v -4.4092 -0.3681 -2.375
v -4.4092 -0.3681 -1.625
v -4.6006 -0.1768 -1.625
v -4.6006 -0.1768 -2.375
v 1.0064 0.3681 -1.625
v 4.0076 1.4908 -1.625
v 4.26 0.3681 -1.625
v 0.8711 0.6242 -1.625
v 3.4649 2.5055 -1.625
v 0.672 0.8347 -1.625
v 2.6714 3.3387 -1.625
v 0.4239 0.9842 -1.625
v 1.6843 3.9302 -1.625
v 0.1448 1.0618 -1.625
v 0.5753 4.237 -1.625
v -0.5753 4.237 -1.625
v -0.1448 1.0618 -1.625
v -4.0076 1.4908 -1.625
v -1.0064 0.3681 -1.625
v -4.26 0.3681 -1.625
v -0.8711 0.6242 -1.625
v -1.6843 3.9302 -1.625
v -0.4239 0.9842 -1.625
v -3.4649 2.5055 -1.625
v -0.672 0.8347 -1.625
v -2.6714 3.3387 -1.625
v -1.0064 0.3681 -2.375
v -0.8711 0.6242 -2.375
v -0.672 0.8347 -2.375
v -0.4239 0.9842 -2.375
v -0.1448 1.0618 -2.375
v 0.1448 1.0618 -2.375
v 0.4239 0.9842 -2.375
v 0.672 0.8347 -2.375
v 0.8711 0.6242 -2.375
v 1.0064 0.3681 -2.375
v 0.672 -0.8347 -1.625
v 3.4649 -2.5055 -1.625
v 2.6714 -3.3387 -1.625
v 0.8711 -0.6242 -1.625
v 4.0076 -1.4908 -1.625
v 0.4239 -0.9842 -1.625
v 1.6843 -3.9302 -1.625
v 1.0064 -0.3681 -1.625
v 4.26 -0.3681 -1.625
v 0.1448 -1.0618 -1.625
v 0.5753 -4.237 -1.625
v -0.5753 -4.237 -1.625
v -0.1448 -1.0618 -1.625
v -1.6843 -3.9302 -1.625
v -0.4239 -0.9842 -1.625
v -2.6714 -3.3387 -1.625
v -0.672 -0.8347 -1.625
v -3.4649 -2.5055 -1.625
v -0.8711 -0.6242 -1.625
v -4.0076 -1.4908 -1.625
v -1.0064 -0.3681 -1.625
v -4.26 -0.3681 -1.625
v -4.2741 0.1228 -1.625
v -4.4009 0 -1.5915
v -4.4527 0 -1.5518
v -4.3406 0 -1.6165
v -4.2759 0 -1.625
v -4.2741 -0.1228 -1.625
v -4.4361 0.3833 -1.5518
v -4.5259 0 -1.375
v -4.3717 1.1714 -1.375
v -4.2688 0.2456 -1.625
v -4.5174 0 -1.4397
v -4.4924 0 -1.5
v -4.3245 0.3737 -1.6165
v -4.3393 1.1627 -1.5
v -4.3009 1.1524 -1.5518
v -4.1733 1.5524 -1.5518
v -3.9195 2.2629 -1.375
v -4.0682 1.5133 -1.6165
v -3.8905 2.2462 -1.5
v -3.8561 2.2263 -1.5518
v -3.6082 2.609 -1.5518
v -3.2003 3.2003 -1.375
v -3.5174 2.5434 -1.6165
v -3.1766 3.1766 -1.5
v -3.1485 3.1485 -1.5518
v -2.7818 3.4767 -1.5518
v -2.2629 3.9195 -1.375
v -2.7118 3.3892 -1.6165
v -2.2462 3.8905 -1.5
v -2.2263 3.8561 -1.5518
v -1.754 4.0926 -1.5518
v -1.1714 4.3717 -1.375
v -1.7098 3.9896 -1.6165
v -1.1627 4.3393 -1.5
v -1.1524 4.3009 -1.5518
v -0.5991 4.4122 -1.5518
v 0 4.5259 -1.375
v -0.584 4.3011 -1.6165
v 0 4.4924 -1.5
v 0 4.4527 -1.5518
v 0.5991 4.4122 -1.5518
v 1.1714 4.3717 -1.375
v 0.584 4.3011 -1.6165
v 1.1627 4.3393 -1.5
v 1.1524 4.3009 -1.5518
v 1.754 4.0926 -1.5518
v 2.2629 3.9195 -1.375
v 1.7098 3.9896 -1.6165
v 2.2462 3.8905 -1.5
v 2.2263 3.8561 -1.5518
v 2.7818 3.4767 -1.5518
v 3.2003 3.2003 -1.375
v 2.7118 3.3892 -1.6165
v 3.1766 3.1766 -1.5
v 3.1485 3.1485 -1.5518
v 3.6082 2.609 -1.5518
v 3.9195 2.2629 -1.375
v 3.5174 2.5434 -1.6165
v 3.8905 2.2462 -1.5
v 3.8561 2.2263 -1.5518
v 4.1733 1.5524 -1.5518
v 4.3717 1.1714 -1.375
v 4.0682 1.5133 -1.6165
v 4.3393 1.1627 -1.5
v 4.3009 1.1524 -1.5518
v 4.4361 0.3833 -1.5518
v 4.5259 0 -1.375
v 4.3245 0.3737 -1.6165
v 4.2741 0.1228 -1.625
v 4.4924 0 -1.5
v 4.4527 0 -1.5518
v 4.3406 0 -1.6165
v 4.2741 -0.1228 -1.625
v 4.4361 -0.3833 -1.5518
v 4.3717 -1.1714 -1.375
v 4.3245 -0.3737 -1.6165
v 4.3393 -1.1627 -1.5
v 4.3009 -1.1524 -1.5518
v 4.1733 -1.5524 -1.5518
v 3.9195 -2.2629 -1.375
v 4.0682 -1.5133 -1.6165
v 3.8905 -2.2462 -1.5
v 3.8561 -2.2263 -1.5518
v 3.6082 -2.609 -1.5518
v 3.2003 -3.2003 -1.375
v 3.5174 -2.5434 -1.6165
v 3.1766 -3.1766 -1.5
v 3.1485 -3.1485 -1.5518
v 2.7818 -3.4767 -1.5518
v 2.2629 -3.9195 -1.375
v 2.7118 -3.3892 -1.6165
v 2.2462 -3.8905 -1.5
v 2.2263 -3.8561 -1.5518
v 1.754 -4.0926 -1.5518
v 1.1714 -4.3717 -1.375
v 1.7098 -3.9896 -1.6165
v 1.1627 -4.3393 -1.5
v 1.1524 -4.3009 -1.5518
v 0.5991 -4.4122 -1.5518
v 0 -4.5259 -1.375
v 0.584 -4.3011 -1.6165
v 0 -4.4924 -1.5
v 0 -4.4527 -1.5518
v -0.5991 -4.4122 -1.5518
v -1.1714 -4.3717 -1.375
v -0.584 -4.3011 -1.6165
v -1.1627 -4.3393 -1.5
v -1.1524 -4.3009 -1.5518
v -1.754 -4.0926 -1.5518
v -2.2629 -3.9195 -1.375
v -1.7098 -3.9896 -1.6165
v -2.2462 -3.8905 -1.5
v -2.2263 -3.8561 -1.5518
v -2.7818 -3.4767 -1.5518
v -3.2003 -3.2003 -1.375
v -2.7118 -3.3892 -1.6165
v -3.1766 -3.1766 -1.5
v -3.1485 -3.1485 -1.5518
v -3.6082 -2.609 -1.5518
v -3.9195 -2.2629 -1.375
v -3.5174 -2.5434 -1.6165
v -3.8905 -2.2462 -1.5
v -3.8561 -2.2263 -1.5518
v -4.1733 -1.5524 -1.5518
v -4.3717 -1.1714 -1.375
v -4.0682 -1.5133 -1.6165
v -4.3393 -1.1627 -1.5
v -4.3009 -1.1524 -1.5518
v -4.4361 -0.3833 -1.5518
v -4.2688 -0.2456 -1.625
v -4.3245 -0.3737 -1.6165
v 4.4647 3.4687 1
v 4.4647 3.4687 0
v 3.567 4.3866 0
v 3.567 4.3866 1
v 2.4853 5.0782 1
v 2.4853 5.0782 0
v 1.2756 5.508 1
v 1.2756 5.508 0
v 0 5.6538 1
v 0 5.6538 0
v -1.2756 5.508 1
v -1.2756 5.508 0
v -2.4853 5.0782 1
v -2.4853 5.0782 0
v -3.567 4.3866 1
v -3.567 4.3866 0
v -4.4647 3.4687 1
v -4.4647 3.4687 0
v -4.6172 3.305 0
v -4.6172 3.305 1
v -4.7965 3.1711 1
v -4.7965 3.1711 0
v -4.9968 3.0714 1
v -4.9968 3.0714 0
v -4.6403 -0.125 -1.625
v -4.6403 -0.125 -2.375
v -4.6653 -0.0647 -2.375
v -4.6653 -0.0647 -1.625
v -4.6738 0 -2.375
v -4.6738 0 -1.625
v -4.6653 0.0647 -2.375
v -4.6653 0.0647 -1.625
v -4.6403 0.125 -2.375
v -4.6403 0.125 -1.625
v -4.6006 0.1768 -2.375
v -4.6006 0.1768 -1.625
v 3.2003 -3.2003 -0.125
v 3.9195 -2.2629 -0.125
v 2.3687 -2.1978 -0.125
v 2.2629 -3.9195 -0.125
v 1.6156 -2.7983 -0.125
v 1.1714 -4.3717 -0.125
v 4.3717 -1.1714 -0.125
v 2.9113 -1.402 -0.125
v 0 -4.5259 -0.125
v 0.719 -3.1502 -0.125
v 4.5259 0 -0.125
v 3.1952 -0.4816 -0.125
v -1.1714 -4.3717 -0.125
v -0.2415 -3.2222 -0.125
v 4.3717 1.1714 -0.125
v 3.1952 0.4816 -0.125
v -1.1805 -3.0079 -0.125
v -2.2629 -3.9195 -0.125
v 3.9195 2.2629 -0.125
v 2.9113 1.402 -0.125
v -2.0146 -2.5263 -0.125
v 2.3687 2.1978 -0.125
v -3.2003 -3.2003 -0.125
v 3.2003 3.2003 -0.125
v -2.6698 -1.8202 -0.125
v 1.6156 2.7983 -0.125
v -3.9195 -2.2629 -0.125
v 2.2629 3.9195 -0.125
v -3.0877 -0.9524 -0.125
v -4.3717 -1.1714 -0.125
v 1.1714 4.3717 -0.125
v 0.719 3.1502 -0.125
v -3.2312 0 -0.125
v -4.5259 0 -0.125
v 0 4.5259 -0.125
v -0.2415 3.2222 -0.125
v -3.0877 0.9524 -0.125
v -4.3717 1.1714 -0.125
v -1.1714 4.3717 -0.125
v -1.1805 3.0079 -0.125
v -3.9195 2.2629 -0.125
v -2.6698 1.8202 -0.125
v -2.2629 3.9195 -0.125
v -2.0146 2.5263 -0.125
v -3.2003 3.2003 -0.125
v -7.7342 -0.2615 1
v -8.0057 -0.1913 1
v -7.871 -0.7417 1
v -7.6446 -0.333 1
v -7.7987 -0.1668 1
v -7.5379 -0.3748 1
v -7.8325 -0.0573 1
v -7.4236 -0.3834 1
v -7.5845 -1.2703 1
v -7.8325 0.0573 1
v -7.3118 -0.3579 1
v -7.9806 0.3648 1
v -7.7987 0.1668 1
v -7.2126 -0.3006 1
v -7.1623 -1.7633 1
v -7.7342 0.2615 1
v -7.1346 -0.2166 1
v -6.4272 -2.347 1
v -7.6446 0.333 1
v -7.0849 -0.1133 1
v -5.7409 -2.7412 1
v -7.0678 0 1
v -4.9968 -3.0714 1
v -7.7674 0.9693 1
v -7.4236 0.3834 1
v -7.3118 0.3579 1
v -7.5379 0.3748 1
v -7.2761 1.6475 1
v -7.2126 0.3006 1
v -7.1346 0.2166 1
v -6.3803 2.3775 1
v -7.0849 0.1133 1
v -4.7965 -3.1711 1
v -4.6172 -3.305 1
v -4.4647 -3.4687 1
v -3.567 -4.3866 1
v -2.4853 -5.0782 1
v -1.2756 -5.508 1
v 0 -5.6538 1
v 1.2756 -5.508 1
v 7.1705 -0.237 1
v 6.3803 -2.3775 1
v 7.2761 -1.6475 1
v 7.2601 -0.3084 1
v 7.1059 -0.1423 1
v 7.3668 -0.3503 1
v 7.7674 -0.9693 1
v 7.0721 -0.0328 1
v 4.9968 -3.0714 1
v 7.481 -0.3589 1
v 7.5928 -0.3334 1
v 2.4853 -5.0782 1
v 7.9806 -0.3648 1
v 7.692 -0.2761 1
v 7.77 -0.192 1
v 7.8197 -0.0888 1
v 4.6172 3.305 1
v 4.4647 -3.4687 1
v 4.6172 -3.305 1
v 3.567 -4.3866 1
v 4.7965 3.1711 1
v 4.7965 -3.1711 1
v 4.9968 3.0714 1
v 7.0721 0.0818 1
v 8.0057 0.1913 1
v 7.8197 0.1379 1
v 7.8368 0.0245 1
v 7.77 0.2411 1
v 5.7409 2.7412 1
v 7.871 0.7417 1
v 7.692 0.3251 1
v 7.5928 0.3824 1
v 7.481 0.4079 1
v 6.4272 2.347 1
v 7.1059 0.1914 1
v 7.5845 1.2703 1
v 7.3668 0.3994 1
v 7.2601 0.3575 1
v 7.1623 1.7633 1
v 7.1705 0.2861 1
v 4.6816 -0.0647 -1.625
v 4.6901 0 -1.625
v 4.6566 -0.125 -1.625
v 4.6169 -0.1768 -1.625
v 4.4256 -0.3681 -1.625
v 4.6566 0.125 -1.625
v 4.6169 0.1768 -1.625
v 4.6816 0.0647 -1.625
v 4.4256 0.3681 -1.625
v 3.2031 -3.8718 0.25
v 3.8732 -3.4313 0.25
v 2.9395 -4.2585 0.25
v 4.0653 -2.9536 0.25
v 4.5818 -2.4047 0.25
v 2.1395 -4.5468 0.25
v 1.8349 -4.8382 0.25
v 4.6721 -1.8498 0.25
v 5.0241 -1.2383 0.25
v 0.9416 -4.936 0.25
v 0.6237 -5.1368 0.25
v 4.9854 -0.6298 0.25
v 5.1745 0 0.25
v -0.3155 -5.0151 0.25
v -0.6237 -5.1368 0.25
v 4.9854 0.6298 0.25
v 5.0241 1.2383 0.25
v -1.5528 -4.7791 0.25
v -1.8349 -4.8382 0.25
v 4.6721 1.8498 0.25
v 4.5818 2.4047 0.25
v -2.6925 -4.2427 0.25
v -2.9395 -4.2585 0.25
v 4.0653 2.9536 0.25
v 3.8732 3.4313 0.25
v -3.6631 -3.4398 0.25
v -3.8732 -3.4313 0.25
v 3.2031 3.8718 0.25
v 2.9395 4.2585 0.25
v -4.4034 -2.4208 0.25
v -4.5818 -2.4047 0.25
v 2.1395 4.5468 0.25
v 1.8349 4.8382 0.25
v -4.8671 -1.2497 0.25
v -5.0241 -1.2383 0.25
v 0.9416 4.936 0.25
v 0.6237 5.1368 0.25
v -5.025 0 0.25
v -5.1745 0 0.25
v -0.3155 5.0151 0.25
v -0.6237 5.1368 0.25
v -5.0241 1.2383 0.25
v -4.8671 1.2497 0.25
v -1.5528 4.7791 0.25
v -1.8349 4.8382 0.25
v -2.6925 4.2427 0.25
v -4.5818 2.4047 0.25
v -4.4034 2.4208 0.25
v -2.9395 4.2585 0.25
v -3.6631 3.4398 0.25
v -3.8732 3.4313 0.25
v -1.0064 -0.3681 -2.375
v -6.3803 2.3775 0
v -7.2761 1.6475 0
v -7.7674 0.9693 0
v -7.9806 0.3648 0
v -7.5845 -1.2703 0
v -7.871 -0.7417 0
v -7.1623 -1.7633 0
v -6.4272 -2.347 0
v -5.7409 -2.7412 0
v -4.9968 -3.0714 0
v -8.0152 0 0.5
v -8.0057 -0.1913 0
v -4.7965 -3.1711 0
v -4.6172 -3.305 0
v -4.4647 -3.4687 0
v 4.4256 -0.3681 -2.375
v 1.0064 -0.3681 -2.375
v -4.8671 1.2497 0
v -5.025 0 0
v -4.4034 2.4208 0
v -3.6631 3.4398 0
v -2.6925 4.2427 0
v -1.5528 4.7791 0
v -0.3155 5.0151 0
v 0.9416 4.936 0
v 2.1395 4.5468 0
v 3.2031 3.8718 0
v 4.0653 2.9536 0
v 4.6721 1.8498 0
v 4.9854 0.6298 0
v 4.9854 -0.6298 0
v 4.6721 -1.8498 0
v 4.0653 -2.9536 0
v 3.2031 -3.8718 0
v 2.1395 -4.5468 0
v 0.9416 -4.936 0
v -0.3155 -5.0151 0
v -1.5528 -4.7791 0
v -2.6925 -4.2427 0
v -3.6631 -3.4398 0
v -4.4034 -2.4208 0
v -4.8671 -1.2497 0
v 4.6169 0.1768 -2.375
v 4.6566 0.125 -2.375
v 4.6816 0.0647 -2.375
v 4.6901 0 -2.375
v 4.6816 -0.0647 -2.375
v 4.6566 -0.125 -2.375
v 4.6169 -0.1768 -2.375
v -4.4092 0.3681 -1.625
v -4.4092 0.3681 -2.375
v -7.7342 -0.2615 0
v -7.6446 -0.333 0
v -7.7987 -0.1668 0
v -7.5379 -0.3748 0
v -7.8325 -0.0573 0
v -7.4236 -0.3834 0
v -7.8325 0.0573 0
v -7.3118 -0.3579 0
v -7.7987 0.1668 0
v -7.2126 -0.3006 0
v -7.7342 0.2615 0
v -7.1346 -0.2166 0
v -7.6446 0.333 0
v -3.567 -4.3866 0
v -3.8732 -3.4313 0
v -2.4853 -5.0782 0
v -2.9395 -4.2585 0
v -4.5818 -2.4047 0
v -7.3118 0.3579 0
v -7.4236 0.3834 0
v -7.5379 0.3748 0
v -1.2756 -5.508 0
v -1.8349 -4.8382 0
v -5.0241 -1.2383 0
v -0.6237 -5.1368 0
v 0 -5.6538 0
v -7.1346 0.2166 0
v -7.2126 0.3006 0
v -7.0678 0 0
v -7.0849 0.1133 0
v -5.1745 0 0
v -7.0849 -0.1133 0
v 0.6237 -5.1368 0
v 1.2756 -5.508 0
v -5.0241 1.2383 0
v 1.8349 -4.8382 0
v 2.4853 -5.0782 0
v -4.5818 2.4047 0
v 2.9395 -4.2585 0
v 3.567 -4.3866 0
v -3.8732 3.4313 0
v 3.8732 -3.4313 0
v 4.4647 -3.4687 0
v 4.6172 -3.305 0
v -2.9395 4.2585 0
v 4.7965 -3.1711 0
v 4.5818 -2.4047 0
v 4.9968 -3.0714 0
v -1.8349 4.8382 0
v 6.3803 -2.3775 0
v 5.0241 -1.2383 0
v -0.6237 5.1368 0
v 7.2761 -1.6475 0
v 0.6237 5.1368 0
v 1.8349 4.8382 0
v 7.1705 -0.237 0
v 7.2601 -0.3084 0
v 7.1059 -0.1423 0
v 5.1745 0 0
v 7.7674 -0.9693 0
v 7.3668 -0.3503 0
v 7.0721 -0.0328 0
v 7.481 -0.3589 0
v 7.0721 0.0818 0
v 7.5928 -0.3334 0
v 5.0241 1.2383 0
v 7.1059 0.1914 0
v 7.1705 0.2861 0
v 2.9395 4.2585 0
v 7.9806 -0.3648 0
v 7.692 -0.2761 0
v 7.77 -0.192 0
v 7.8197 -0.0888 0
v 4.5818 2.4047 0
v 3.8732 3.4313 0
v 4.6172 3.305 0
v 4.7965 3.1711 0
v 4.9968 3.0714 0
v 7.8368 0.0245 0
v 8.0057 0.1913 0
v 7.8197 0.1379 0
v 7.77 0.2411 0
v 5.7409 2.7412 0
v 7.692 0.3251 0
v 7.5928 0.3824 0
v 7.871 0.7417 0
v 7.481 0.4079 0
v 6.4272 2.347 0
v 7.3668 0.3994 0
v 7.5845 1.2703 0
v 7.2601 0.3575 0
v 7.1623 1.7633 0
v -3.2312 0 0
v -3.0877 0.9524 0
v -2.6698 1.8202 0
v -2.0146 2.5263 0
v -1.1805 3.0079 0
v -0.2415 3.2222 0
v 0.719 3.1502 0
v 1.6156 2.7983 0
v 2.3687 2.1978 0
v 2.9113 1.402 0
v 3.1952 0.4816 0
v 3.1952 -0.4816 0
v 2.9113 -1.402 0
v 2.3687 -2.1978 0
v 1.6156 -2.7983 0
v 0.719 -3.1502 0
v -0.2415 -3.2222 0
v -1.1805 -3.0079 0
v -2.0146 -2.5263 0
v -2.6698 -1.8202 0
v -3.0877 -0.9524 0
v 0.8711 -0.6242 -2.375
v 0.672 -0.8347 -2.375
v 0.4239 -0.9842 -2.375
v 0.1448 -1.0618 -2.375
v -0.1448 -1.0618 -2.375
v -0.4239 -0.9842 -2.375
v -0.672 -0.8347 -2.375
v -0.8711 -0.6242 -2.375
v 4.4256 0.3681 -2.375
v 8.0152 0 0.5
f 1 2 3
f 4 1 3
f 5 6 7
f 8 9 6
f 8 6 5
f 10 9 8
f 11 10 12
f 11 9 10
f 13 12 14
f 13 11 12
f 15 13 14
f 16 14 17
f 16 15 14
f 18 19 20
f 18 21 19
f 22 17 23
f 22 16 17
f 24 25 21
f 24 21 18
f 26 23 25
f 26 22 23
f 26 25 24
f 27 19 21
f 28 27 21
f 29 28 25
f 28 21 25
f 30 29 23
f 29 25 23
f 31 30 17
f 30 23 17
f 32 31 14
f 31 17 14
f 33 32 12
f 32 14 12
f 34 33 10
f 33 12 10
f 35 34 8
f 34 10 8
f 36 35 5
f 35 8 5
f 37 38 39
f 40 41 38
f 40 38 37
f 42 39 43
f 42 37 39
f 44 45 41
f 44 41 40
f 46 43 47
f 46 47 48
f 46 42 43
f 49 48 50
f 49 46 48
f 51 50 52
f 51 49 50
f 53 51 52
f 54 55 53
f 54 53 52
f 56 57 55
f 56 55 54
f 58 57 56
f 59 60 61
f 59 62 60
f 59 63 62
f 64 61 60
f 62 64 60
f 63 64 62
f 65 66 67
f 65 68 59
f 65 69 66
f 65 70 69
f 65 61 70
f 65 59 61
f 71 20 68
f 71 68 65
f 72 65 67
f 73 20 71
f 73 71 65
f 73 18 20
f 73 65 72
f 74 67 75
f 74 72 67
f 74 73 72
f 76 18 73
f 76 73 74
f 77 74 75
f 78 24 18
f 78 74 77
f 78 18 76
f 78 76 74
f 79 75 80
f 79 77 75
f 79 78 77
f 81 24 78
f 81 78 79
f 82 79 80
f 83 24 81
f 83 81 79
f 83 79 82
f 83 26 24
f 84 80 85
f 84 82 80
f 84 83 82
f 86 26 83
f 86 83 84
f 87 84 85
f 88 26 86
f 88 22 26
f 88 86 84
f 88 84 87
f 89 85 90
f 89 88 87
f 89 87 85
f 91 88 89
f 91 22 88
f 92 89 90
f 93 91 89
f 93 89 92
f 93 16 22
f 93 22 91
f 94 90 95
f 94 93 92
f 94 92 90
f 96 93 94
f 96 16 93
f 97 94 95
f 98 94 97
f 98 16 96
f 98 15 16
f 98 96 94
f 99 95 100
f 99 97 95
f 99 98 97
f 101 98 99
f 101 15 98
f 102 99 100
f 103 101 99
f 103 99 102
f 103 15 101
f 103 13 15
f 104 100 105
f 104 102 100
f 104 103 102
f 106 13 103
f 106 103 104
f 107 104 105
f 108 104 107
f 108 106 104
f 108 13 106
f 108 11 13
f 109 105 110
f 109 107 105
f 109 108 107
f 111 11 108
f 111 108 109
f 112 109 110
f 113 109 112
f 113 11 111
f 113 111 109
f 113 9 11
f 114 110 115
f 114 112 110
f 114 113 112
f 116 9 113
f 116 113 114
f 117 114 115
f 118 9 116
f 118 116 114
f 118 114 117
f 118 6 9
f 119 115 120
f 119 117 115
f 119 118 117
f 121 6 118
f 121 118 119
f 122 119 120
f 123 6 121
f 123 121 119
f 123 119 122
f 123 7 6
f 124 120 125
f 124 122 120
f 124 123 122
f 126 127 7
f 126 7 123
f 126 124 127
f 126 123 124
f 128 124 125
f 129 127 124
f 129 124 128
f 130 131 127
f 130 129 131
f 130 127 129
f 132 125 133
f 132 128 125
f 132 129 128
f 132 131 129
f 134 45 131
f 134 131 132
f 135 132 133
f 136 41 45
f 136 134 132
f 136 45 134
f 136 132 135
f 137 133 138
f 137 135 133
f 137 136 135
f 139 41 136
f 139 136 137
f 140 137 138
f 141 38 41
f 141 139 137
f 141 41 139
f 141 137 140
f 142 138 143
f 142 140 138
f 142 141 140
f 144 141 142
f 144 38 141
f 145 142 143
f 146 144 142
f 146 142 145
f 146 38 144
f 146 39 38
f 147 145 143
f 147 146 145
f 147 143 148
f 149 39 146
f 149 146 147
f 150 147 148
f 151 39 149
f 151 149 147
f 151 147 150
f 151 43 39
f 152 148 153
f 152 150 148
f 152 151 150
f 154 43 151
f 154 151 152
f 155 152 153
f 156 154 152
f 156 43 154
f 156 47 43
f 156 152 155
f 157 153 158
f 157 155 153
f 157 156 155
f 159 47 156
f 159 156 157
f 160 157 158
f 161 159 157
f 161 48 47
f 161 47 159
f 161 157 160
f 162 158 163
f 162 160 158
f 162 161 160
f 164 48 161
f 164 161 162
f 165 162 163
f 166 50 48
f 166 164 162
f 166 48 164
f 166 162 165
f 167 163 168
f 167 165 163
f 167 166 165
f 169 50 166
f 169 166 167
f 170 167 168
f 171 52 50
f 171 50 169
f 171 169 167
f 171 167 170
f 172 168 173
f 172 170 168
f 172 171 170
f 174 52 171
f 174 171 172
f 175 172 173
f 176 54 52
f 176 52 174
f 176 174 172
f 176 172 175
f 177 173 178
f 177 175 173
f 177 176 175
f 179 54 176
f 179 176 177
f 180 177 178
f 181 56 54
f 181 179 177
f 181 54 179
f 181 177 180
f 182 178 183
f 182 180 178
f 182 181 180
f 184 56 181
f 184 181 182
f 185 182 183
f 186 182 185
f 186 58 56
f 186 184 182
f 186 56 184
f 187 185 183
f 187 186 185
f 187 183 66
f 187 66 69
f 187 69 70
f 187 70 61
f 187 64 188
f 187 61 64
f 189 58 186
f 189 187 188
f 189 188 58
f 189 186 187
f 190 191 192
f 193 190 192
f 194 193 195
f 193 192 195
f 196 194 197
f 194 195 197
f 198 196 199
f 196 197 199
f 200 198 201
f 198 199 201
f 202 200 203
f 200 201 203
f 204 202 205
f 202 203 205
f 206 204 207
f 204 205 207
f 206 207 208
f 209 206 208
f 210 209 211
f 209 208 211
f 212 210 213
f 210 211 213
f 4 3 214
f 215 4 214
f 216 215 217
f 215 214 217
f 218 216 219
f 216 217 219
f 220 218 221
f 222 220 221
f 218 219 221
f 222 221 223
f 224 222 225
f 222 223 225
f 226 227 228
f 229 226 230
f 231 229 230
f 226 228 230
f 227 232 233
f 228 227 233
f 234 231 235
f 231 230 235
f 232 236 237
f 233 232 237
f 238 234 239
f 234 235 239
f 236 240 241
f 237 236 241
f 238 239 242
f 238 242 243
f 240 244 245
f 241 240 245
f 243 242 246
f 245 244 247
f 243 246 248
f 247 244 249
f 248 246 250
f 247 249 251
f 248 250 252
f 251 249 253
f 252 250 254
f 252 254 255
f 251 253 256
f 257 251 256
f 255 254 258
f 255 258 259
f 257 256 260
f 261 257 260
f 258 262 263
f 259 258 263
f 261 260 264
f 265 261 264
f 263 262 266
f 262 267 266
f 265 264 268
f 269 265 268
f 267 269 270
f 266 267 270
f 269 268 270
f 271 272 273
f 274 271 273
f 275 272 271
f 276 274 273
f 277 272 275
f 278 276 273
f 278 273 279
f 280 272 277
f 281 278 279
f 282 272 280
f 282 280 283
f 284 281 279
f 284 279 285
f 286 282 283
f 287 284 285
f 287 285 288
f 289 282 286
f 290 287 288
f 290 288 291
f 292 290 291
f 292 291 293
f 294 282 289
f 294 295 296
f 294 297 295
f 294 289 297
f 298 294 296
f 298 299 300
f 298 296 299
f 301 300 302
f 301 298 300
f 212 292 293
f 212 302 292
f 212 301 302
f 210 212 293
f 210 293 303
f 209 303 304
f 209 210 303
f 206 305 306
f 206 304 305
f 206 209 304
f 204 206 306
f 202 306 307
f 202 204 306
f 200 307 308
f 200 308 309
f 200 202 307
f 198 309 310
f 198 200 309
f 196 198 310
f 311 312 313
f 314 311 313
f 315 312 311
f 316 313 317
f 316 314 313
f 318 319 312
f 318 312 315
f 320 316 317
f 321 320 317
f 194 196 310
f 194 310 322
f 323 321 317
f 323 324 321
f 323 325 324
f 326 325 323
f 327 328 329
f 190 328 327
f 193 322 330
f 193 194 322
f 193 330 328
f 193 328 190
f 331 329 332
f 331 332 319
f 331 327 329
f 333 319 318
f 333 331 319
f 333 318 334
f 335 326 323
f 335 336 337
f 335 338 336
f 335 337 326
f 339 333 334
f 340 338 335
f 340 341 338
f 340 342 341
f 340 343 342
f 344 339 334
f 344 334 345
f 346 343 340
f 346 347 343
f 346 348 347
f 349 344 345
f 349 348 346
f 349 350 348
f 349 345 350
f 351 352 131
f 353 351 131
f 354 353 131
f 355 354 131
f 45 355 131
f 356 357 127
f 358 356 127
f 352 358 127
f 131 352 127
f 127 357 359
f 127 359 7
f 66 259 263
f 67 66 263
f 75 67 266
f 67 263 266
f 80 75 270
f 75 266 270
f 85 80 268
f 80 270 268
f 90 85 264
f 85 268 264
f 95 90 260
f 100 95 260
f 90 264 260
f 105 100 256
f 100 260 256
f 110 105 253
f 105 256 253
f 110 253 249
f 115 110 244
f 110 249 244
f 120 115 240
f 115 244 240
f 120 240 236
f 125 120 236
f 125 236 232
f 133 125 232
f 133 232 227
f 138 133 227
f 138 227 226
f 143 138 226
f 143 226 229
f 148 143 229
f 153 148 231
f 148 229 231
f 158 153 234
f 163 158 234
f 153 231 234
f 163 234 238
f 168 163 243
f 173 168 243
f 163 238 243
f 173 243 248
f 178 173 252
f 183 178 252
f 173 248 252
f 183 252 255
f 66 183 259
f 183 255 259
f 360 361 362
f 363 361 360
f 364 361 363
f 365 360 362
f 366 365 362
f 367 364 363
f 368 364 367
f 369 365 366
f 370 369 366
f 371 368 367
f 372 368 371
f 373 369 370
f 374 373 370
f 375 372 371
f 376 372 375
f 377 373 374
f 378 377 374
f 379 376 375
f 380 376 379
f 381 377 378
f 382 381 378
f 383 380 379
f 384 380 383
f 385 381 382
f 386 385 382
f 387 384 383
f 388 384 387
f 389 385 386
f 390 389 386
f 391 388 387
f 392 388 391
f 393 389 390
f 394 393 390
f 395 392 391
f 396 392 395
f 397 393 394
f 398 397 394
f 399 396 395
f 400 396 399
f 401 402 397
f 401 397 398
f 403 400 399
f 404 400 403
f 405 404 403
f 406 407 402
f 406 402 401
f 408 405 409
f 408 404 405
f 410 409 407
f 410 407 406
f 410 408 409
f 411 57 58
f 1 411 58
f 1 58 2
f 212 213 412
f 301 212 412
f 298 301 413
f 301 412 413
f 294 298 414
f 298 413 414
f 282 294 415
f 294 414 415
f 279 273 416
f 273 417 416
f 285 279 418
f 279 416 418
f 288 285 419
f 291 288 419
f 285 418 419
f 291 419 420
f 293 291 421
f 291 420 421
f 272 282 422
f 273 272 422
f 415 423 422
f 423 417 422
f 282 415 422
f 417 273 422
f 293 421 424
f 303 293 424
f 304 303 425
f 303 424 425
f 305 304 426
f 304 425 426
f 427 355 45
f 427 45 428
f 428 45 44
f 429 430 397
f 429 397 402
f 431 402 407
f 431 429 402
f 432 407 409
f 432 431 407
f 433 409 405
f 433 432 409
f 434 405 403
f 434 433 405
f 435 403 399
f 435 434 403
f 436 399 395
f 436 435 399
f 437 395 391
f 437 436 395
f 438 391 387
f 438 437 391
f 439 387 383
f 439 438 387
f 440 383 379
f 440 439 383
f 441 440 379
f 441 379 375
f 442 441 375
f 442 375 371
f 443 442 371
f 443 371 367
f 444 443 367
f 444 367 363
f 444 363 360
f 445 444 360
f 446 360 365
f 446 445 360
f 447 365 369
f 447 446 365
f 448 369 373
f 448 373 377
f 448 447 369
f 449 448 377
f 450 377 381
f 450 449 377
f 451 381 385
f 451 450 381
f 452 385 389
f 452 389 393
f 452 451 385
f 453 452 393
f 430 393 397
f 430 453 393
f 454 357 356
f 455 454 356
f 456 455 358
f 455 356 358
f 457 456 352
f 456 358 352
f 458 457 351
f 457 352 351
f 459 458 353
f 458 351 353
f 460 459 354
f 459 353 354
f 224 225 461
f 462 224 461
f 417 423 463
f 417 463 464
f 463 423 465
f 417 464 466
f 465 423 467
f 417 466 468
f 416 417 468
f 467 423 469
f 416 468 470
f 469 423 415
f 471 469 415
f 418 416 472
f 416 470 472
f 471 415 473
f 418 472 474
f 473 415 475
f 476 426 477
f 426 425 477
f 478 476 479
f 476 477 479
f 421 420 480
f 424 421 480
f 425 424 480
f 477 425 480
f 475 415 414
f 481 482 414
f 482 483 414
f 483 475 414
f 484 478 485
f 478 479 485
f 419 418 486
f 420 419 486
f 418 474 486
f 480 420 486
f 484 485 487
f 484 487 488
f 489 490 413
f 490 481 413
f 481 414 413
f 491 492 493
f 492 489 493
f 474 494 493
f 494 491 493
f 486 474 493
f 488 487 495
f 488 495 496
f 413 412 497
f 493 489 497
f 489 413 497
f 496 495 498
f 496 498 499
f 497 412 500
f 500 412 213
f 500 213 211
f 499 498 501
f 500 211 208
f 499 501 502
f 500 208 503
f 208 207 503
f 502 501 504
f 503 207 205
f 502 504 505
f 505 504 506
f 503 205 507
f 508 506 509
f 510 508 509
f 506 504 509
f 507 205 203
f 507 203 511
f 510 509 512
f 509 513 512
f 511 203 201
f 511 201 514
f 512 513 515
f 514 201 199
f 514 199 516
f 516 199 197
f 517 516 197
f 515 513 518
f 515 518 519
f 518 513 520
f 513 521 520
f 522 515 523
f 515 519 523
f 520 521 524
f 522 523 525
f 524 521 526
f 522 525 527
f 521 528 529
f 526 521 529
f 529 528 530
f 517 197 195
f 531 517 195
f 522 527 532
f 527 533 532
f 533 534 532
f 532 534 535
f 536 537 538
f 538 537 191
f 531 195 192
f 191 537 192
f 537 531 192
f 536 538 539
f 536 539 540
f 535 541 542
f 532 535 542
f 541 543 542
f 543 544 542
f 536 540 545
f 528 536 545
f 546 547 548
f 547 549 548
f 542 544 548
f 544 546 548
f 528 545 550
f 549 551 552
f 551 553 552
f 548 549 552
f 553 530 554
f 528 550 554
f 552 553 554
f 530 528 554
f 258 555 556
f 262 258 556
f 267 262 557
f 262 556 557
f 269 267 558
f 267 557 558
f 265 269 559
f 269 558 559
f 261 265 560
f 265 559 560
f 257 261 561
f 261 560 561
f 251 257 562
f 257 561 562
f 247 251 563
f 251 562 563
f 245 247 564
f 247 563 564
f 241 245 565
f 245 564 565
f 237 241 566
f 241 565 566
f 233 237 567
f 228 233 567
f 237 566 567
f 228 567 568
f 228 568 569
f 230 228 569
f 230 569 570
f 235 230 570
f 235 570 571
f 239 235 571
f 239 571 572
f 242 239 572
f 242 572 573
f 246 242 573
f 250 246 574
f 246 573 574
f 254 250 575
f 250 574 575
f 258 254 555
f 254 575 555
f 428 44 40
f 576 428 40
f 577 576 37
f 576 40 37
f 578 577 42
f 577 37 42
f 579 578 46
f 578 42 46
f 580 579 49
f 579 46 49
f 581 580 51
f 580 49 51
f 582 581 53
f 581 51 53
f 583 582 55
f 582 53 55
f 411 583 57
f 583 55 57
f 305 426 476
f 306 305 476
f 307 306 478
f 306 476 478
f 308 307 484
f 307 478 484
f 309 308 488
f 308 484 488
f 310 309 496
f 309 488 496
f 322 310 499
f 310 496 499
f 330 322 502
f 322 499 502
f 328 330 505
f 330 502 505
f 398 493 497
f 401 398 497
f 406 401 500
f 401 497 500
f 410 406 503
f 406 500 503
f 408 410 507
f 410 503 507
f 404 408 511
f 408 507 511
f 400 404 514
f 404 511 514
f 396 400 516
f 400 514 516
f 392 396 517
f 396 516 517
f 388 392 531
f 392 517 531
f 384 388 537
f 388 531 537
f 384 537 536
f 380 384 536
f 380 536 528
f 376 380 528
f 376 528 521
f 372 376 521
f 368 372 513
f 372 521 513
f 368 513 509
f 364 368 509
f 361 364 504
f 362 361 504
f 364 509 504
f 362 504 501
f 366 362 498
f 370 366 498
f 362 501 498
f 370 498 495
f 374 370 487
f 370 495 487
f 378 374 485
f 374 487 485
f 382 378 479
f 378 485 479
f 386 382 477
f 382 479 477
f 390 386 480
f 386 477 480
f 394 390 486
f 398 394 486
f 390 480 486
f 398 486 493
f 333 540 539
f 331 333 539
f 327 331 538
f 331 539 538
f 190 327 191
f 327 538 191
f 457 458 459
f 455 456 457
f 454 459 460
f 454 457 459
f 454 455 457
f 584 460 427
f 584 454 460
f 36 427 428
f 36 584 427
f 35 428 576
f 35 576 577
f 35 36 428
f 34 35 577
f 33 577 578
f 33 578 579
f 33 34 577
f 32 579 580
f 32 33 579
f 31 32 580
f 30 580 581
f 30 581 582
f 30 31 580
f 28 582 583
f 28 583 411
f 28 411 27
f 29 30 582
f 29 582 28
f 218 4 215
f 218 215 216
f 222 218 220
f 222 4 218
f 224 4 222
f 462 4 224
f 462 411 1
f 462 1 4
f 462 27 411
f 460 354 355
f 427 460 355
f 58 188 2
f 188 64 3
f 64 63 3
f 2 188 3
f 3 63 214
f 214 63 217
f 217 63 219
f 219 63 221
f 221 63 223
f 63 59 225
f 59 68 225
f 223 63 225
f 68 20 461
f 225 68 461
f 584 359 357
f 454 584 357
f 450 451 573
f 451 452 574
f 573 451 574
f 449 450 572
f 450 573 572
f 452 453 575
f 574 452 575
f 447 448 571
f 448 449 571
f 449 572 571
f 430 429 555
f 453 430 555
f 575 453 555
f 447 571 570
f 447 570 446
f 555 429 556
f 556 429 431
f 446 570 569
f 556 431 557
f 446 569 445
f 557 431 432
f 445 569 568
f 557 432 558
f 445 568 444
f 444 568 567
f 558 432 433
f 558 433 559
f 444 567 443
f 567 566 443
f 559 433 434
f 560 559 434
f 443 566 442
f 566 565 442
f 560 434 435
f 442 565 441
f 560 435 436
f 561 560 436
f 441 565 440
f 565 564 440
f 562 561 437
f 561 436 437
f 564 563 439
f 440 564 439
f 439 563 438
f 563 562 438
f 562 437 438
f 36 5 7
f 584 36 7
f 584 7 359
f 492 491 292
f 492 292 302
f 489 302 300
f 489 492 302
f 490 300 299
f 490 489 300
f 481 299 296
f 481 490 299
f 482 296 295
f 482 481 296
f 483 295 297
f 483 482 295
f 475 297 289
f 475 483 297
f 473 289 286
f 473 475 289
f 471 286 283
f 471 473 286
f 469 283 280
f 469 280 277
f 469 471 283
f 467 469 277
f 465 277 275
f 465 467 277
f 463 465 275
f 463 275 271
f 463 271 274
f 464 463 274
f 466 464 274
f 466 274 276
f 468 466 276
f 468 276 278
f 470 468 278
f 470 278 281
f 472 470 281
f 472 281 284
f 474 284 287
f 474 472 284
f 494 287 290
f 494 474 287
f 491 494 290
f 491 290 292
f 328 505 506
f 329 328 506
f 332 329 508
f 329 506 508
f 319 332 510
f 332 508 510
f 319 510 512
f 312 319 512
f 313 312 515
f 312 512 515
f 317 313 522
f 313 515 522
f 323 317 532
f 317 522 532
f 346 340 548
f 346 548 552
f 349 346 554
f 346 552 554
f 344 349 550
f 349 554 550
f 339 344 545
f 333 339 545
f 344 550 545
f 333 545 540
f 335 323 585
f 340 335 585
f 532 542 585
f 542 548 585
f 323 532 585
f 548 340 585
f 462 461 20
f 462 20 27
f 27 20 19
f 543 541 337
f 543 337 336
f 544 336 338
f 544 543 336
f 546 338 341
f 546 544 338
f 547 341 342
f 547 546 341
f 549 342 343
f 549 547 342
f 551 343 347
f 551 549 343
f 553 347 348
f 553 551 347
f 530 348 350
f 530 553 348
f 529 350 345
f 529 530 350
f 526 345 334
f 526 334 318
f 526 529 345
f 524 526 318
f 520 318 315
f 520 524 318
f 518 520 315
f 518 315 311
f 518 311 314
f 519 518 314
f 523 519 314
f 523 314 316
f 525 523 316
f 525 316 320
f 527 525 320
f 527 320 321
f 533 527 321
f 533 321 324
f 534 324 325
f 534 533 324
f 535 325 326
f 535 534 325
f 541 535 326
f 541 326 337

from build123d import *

# Parameters (mm, degrees)
SKETCH1_R           = 1.537908455
BOSS_EXTRUDE1_DEPTH = 4
SKETCH2_R           = 20.698021895
SKETCH2_R_2         = 20.1
CUT_EXTRUDE1_DEPTH  = 1
SKETCH3_R           = 12.92497531
BOSS_EXTRUDE2_DEPTH = 0.5
SKETCH4_R           = 18.103513597
BOSS_EXTRUDE3_DEPTH = 6
FILLET1_R           = 1
BOSS_EXTRUDE4_DEPTH = 3
SCALE2_SCALE        = 0.5
SCALE3_SCALE        = 0.5


with BuildPart() as part:
    # Sketch1 → Boss-Extrude1 (new body)
    with BuildSketch(Plane.XY):
        with BuildLine():
            ThreePointArc((-17.85861924, -13.874920024), (0, -22.615120756), (17.85861924, -13.874920024))
            ThreePointArc((17.85861924, -13.874920024), (18.815427461, -12.936233048), (19.987223835, -12.285457765))
            add(Edge.make_bspline(
                [(19.987223835, -12.285457765), (51.427576939, 0), (19.987223835, 12.285457765)],
                knots=[5.385493495, 5.385493495, 5.385493495, 7.180877119, 7.180877119, 7.180877119], degree=2, weights=[1, 0.623416377, 1]))
            ThreePointArc((19.987223835, 12.285457765), (18.815427461, 12.936233048), (17.85861924, 13.874920024))
            ThreePointArc((17.85861924, 13.874920024), (0, 22.615120756), (-17.85861924, 13.874920024))
            ThreePointArc((-17.85861924, 13.874920024), (-18.815427461, 12.936233048), (-19.987223835, 12.285457765))
            add(Edge.make_bspline(
                [(-19.987223835, 12.285457765), (-51.427576939, 0), (-19.987223835, -12.285457765)],
                knots=[2.243900842, 2.243900842, 2.243900842, 4.039284465, 4.039284465, 4.039284465], degree=2, weights=[1, 0.623416377, 1]))
            ThreePointArc((-19.987223835, -12.285457765), (-18.815427461, -12.936233048), (-17.85861924, -13.874920024))
        make_face()
        with Locations((-29.809246855, 0)):
            Circle(SKETCH1_R, mode=Mode.SUBTRACT)
        with Locations((29.809246855, 0.098164369)):
            Circle(SKETCH1_R, mode=Mode.SUBTRACT)
    extrude(amount=BOSS_EXTRUDE1_DEPTH)

    # Sketch2 → Cut-Extrude1 (cut)
    with BuildSketch(Plane(origin=(0, 0, 0), x_dir=(-1, 0, 0), z_dir=(0, 0, -1))):
        Circle(SKETCH2_R)
        Circle(SKETCH2_R_2, mode=Mode.SUBTRACT)
    extrude(amount=-CUT_EXTRUDE1_DEPTH, mode=Mode.SUBTRACT)

    # Sketch3 → Boss-Extrude2 (add)
    with BuildSketch(Plane(origin=(0, 0, 0), x_dir=(-1, 0, 0), z_dir=(0, 0, -1))):
        Circle(SKETCH3_R)
    extrude(amount=BOSS_EXTRUDE2_DEPTH)

    # Sketch4 → Boss-Extrude3 (add)
    with BuildSketch(Plane(origin=(0, 0, -0.5), x_dir=(-1, 0, 0), z_dir=(0, 0, -1))):
        Circle(SKETCH4_R)
    extrude(amount=BOSS_EXTRUDE3_DEPTH)

    # Fillet1
    fillet1_edges = [part.edges().sort_by_distance(p)[0] for p in [
        (18.103513597, 0, -6.5),
    ]]
    fillet(fillet1_edges, radius=FILLET1_R)

    # Sketch5 → Boss-Extrude4 (add)
    with BuildSketch(Plane(origin=(0, 0, -6.5), x_dir=(-1, 0, 0), z_dir=(0, 0, -1))):
        with BuildLine():
            Line((-4.025670138, 1.472465542), (-17.702307957, 1.472465542))
            Line((-17.702307957, 1.472465542), (-18.467666717, 0.707106781))
            ThreePointArc((-18.467666717, 0.707106781), (-18.760559936, 0), (-18.467666717, -0.707106781))
            Line((-18.467666717, -0.707106781), (-17.702307957, -1.472465542))
            Line((-17.702307957, -1.472465542), (-4.025670138, -1.472465542))
            ThreePointArc((-4.025670138, -1.472465542), (0, -4.286510799), (4.025670138, -1.472465542))
            Line((4.025670138, -1.472465542), (17.636865044, -1.472465542))
            Line((17.636865044, -1.472465542), (18.402223804, -0.707106781))
            ThreePointArc((18.402223804, -0.707106781), (18.695117023, 0), (18.402223804, 0.707106781))
            Line((18.402223804, 0.707106781), (17.636865044, 1.472465542))
            Line((17.636865044, 1.472465542), (4.025670138, 1.472465542))
            ThreePointArc((4.025670138, 1.472465542), (0, 4.286510799), (-4.025670138, 1.472465542))
        make_face()
    extrude(amount=BOSS_EXTRUDE4_DEPTH)


with BuildPart() as part_1:
    # Scale2: scaled about (0, 0, 0)
    add(part.part.scale(SCALE2_SCALE))


with BuildPart() as part_2:
    # Scale3: scaled about (0, 0, 0)
    add(part_1.part.scale(SCALE3_SCALE))


solid = part_2.part
